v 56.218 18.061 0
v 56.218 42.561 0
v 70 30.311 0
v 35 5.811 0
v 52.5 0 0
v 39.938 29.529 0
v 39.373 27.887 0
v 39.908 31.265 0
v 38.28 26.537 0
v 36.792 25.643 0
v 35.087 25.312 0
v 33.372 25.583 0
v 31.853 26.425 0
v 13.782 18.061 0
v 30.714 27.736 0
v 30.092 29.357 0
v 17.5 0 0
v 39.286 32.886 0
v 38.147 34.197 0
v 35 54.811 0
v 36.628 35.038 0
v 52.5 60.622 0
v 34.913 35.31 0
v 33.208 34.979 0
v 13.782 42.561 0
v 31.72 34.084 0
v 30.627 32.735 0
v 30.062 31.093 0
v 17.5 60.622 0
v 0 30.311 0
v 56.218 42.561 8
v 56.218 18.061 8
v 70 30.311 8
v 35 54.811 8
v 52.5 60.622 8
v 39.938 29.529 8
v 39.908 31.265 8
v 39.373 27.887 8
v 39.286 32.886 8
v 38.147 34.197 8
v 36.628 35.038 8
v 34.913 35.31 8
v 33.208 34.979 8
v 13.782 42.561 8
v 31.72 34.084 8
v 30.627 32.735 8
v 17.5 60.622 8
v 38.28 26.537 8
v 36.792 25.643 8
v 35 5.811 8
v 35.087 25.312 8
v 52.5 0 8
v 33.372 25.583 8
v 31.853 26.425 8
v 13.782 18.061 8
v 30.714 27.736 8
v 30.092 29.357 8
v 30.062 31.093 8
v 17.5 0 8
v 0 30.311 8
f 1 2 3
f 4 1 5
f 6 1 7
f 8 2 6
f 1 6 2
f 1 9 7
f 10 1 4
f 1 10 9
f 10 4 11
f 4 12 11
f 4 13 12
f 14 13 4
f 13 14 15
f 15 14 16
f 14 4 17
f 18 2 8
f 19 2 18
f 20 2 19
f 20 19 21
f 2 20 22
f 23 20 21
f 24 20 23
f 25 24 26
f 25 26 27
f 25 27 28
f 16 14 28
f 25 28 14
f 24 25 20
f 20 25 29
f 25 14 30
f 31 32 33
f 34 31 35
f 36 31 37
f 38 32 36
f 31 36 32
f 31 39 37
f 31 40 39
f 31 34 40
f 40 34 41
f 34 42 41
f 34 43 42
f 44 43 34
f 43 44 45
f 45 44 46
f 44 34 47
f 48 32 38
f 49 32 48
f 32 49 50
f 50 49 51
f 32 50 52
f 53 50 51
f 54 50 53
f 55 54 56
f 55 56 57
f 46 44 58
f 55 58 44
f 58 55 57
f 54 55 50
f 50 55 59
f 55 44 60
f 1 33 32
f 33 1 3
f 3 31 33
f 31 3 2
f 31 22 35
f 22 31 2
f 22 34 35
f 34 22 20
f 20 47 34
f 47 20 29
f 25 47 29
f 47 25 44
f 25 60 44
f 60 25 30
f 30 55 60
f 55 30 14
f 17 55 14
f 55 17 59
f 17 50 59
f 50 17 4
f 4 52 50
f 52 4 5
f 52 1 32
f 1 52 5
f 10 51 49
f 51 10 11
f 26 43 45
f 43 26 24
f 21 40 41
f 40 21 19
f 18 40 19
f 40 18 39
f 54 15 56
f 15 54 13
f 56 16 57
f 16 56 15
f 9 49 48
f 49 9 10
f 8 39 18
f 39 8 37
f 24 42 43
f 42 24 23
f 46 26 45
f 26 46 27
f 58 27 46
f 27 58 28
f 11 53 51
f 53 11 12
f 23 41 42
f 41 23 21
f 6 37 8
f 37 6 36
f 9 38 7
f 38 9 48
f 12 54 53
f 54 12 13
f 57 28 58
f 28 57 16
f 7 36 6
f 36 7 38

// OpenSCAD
$fn = 32;

// ----------------------------------------------------------------------
// Star wheel: 6-point blunt, R35
// ----------------------------------------------------------------------

// --- parameters (mm) ---
n_points = 6;             // number of points / teeth
r_out = 35;               // tip radius
r_in = 24.5;              // root radius
bore_r = 5;               // centre bore radius
plate_t = 8;              // plate thickness, Z (extrusion height)
bore_d = 10;              // centre bore diameter

profile = [[70, 30.311], [56.218, 42.561], [52.5, 60.622], [35, 54.811], [17.5, 60.622], [13.782, 42.561], [0, 30.311], [13.782, 18.061], [17.5, 0], [35, 5.811], [52.5, 0], [56.218, 18.061]];  // primary outline, 12 points, counter clockwise
void_1 = [[39.908, 31.265], [39.286, 32.886], [38.147, 34.197], [36.628, 35.038], [34.913, 35.31], [33.208, 34.979], [31.72, 34.084], [30.627, 32.735], [30.062, 31.093], [30.092, 29.357], [30.714, 27.736], [31.853, 26.425], [33.372, 25.583], [35.087, 25.312], [36.792, 25.643], [38.28, 26.537], [39.373, 27.887], [39.938, 29.529]];  // centre bore, 18 points

// --- the one profile operation ---
difference() {
  linear_extrude(height = plate_t) polygon(points = profile);
  translate([0, 0, -1])
    linear_extrude(height = plate_t + 2) polygon(points = void_1);
}
